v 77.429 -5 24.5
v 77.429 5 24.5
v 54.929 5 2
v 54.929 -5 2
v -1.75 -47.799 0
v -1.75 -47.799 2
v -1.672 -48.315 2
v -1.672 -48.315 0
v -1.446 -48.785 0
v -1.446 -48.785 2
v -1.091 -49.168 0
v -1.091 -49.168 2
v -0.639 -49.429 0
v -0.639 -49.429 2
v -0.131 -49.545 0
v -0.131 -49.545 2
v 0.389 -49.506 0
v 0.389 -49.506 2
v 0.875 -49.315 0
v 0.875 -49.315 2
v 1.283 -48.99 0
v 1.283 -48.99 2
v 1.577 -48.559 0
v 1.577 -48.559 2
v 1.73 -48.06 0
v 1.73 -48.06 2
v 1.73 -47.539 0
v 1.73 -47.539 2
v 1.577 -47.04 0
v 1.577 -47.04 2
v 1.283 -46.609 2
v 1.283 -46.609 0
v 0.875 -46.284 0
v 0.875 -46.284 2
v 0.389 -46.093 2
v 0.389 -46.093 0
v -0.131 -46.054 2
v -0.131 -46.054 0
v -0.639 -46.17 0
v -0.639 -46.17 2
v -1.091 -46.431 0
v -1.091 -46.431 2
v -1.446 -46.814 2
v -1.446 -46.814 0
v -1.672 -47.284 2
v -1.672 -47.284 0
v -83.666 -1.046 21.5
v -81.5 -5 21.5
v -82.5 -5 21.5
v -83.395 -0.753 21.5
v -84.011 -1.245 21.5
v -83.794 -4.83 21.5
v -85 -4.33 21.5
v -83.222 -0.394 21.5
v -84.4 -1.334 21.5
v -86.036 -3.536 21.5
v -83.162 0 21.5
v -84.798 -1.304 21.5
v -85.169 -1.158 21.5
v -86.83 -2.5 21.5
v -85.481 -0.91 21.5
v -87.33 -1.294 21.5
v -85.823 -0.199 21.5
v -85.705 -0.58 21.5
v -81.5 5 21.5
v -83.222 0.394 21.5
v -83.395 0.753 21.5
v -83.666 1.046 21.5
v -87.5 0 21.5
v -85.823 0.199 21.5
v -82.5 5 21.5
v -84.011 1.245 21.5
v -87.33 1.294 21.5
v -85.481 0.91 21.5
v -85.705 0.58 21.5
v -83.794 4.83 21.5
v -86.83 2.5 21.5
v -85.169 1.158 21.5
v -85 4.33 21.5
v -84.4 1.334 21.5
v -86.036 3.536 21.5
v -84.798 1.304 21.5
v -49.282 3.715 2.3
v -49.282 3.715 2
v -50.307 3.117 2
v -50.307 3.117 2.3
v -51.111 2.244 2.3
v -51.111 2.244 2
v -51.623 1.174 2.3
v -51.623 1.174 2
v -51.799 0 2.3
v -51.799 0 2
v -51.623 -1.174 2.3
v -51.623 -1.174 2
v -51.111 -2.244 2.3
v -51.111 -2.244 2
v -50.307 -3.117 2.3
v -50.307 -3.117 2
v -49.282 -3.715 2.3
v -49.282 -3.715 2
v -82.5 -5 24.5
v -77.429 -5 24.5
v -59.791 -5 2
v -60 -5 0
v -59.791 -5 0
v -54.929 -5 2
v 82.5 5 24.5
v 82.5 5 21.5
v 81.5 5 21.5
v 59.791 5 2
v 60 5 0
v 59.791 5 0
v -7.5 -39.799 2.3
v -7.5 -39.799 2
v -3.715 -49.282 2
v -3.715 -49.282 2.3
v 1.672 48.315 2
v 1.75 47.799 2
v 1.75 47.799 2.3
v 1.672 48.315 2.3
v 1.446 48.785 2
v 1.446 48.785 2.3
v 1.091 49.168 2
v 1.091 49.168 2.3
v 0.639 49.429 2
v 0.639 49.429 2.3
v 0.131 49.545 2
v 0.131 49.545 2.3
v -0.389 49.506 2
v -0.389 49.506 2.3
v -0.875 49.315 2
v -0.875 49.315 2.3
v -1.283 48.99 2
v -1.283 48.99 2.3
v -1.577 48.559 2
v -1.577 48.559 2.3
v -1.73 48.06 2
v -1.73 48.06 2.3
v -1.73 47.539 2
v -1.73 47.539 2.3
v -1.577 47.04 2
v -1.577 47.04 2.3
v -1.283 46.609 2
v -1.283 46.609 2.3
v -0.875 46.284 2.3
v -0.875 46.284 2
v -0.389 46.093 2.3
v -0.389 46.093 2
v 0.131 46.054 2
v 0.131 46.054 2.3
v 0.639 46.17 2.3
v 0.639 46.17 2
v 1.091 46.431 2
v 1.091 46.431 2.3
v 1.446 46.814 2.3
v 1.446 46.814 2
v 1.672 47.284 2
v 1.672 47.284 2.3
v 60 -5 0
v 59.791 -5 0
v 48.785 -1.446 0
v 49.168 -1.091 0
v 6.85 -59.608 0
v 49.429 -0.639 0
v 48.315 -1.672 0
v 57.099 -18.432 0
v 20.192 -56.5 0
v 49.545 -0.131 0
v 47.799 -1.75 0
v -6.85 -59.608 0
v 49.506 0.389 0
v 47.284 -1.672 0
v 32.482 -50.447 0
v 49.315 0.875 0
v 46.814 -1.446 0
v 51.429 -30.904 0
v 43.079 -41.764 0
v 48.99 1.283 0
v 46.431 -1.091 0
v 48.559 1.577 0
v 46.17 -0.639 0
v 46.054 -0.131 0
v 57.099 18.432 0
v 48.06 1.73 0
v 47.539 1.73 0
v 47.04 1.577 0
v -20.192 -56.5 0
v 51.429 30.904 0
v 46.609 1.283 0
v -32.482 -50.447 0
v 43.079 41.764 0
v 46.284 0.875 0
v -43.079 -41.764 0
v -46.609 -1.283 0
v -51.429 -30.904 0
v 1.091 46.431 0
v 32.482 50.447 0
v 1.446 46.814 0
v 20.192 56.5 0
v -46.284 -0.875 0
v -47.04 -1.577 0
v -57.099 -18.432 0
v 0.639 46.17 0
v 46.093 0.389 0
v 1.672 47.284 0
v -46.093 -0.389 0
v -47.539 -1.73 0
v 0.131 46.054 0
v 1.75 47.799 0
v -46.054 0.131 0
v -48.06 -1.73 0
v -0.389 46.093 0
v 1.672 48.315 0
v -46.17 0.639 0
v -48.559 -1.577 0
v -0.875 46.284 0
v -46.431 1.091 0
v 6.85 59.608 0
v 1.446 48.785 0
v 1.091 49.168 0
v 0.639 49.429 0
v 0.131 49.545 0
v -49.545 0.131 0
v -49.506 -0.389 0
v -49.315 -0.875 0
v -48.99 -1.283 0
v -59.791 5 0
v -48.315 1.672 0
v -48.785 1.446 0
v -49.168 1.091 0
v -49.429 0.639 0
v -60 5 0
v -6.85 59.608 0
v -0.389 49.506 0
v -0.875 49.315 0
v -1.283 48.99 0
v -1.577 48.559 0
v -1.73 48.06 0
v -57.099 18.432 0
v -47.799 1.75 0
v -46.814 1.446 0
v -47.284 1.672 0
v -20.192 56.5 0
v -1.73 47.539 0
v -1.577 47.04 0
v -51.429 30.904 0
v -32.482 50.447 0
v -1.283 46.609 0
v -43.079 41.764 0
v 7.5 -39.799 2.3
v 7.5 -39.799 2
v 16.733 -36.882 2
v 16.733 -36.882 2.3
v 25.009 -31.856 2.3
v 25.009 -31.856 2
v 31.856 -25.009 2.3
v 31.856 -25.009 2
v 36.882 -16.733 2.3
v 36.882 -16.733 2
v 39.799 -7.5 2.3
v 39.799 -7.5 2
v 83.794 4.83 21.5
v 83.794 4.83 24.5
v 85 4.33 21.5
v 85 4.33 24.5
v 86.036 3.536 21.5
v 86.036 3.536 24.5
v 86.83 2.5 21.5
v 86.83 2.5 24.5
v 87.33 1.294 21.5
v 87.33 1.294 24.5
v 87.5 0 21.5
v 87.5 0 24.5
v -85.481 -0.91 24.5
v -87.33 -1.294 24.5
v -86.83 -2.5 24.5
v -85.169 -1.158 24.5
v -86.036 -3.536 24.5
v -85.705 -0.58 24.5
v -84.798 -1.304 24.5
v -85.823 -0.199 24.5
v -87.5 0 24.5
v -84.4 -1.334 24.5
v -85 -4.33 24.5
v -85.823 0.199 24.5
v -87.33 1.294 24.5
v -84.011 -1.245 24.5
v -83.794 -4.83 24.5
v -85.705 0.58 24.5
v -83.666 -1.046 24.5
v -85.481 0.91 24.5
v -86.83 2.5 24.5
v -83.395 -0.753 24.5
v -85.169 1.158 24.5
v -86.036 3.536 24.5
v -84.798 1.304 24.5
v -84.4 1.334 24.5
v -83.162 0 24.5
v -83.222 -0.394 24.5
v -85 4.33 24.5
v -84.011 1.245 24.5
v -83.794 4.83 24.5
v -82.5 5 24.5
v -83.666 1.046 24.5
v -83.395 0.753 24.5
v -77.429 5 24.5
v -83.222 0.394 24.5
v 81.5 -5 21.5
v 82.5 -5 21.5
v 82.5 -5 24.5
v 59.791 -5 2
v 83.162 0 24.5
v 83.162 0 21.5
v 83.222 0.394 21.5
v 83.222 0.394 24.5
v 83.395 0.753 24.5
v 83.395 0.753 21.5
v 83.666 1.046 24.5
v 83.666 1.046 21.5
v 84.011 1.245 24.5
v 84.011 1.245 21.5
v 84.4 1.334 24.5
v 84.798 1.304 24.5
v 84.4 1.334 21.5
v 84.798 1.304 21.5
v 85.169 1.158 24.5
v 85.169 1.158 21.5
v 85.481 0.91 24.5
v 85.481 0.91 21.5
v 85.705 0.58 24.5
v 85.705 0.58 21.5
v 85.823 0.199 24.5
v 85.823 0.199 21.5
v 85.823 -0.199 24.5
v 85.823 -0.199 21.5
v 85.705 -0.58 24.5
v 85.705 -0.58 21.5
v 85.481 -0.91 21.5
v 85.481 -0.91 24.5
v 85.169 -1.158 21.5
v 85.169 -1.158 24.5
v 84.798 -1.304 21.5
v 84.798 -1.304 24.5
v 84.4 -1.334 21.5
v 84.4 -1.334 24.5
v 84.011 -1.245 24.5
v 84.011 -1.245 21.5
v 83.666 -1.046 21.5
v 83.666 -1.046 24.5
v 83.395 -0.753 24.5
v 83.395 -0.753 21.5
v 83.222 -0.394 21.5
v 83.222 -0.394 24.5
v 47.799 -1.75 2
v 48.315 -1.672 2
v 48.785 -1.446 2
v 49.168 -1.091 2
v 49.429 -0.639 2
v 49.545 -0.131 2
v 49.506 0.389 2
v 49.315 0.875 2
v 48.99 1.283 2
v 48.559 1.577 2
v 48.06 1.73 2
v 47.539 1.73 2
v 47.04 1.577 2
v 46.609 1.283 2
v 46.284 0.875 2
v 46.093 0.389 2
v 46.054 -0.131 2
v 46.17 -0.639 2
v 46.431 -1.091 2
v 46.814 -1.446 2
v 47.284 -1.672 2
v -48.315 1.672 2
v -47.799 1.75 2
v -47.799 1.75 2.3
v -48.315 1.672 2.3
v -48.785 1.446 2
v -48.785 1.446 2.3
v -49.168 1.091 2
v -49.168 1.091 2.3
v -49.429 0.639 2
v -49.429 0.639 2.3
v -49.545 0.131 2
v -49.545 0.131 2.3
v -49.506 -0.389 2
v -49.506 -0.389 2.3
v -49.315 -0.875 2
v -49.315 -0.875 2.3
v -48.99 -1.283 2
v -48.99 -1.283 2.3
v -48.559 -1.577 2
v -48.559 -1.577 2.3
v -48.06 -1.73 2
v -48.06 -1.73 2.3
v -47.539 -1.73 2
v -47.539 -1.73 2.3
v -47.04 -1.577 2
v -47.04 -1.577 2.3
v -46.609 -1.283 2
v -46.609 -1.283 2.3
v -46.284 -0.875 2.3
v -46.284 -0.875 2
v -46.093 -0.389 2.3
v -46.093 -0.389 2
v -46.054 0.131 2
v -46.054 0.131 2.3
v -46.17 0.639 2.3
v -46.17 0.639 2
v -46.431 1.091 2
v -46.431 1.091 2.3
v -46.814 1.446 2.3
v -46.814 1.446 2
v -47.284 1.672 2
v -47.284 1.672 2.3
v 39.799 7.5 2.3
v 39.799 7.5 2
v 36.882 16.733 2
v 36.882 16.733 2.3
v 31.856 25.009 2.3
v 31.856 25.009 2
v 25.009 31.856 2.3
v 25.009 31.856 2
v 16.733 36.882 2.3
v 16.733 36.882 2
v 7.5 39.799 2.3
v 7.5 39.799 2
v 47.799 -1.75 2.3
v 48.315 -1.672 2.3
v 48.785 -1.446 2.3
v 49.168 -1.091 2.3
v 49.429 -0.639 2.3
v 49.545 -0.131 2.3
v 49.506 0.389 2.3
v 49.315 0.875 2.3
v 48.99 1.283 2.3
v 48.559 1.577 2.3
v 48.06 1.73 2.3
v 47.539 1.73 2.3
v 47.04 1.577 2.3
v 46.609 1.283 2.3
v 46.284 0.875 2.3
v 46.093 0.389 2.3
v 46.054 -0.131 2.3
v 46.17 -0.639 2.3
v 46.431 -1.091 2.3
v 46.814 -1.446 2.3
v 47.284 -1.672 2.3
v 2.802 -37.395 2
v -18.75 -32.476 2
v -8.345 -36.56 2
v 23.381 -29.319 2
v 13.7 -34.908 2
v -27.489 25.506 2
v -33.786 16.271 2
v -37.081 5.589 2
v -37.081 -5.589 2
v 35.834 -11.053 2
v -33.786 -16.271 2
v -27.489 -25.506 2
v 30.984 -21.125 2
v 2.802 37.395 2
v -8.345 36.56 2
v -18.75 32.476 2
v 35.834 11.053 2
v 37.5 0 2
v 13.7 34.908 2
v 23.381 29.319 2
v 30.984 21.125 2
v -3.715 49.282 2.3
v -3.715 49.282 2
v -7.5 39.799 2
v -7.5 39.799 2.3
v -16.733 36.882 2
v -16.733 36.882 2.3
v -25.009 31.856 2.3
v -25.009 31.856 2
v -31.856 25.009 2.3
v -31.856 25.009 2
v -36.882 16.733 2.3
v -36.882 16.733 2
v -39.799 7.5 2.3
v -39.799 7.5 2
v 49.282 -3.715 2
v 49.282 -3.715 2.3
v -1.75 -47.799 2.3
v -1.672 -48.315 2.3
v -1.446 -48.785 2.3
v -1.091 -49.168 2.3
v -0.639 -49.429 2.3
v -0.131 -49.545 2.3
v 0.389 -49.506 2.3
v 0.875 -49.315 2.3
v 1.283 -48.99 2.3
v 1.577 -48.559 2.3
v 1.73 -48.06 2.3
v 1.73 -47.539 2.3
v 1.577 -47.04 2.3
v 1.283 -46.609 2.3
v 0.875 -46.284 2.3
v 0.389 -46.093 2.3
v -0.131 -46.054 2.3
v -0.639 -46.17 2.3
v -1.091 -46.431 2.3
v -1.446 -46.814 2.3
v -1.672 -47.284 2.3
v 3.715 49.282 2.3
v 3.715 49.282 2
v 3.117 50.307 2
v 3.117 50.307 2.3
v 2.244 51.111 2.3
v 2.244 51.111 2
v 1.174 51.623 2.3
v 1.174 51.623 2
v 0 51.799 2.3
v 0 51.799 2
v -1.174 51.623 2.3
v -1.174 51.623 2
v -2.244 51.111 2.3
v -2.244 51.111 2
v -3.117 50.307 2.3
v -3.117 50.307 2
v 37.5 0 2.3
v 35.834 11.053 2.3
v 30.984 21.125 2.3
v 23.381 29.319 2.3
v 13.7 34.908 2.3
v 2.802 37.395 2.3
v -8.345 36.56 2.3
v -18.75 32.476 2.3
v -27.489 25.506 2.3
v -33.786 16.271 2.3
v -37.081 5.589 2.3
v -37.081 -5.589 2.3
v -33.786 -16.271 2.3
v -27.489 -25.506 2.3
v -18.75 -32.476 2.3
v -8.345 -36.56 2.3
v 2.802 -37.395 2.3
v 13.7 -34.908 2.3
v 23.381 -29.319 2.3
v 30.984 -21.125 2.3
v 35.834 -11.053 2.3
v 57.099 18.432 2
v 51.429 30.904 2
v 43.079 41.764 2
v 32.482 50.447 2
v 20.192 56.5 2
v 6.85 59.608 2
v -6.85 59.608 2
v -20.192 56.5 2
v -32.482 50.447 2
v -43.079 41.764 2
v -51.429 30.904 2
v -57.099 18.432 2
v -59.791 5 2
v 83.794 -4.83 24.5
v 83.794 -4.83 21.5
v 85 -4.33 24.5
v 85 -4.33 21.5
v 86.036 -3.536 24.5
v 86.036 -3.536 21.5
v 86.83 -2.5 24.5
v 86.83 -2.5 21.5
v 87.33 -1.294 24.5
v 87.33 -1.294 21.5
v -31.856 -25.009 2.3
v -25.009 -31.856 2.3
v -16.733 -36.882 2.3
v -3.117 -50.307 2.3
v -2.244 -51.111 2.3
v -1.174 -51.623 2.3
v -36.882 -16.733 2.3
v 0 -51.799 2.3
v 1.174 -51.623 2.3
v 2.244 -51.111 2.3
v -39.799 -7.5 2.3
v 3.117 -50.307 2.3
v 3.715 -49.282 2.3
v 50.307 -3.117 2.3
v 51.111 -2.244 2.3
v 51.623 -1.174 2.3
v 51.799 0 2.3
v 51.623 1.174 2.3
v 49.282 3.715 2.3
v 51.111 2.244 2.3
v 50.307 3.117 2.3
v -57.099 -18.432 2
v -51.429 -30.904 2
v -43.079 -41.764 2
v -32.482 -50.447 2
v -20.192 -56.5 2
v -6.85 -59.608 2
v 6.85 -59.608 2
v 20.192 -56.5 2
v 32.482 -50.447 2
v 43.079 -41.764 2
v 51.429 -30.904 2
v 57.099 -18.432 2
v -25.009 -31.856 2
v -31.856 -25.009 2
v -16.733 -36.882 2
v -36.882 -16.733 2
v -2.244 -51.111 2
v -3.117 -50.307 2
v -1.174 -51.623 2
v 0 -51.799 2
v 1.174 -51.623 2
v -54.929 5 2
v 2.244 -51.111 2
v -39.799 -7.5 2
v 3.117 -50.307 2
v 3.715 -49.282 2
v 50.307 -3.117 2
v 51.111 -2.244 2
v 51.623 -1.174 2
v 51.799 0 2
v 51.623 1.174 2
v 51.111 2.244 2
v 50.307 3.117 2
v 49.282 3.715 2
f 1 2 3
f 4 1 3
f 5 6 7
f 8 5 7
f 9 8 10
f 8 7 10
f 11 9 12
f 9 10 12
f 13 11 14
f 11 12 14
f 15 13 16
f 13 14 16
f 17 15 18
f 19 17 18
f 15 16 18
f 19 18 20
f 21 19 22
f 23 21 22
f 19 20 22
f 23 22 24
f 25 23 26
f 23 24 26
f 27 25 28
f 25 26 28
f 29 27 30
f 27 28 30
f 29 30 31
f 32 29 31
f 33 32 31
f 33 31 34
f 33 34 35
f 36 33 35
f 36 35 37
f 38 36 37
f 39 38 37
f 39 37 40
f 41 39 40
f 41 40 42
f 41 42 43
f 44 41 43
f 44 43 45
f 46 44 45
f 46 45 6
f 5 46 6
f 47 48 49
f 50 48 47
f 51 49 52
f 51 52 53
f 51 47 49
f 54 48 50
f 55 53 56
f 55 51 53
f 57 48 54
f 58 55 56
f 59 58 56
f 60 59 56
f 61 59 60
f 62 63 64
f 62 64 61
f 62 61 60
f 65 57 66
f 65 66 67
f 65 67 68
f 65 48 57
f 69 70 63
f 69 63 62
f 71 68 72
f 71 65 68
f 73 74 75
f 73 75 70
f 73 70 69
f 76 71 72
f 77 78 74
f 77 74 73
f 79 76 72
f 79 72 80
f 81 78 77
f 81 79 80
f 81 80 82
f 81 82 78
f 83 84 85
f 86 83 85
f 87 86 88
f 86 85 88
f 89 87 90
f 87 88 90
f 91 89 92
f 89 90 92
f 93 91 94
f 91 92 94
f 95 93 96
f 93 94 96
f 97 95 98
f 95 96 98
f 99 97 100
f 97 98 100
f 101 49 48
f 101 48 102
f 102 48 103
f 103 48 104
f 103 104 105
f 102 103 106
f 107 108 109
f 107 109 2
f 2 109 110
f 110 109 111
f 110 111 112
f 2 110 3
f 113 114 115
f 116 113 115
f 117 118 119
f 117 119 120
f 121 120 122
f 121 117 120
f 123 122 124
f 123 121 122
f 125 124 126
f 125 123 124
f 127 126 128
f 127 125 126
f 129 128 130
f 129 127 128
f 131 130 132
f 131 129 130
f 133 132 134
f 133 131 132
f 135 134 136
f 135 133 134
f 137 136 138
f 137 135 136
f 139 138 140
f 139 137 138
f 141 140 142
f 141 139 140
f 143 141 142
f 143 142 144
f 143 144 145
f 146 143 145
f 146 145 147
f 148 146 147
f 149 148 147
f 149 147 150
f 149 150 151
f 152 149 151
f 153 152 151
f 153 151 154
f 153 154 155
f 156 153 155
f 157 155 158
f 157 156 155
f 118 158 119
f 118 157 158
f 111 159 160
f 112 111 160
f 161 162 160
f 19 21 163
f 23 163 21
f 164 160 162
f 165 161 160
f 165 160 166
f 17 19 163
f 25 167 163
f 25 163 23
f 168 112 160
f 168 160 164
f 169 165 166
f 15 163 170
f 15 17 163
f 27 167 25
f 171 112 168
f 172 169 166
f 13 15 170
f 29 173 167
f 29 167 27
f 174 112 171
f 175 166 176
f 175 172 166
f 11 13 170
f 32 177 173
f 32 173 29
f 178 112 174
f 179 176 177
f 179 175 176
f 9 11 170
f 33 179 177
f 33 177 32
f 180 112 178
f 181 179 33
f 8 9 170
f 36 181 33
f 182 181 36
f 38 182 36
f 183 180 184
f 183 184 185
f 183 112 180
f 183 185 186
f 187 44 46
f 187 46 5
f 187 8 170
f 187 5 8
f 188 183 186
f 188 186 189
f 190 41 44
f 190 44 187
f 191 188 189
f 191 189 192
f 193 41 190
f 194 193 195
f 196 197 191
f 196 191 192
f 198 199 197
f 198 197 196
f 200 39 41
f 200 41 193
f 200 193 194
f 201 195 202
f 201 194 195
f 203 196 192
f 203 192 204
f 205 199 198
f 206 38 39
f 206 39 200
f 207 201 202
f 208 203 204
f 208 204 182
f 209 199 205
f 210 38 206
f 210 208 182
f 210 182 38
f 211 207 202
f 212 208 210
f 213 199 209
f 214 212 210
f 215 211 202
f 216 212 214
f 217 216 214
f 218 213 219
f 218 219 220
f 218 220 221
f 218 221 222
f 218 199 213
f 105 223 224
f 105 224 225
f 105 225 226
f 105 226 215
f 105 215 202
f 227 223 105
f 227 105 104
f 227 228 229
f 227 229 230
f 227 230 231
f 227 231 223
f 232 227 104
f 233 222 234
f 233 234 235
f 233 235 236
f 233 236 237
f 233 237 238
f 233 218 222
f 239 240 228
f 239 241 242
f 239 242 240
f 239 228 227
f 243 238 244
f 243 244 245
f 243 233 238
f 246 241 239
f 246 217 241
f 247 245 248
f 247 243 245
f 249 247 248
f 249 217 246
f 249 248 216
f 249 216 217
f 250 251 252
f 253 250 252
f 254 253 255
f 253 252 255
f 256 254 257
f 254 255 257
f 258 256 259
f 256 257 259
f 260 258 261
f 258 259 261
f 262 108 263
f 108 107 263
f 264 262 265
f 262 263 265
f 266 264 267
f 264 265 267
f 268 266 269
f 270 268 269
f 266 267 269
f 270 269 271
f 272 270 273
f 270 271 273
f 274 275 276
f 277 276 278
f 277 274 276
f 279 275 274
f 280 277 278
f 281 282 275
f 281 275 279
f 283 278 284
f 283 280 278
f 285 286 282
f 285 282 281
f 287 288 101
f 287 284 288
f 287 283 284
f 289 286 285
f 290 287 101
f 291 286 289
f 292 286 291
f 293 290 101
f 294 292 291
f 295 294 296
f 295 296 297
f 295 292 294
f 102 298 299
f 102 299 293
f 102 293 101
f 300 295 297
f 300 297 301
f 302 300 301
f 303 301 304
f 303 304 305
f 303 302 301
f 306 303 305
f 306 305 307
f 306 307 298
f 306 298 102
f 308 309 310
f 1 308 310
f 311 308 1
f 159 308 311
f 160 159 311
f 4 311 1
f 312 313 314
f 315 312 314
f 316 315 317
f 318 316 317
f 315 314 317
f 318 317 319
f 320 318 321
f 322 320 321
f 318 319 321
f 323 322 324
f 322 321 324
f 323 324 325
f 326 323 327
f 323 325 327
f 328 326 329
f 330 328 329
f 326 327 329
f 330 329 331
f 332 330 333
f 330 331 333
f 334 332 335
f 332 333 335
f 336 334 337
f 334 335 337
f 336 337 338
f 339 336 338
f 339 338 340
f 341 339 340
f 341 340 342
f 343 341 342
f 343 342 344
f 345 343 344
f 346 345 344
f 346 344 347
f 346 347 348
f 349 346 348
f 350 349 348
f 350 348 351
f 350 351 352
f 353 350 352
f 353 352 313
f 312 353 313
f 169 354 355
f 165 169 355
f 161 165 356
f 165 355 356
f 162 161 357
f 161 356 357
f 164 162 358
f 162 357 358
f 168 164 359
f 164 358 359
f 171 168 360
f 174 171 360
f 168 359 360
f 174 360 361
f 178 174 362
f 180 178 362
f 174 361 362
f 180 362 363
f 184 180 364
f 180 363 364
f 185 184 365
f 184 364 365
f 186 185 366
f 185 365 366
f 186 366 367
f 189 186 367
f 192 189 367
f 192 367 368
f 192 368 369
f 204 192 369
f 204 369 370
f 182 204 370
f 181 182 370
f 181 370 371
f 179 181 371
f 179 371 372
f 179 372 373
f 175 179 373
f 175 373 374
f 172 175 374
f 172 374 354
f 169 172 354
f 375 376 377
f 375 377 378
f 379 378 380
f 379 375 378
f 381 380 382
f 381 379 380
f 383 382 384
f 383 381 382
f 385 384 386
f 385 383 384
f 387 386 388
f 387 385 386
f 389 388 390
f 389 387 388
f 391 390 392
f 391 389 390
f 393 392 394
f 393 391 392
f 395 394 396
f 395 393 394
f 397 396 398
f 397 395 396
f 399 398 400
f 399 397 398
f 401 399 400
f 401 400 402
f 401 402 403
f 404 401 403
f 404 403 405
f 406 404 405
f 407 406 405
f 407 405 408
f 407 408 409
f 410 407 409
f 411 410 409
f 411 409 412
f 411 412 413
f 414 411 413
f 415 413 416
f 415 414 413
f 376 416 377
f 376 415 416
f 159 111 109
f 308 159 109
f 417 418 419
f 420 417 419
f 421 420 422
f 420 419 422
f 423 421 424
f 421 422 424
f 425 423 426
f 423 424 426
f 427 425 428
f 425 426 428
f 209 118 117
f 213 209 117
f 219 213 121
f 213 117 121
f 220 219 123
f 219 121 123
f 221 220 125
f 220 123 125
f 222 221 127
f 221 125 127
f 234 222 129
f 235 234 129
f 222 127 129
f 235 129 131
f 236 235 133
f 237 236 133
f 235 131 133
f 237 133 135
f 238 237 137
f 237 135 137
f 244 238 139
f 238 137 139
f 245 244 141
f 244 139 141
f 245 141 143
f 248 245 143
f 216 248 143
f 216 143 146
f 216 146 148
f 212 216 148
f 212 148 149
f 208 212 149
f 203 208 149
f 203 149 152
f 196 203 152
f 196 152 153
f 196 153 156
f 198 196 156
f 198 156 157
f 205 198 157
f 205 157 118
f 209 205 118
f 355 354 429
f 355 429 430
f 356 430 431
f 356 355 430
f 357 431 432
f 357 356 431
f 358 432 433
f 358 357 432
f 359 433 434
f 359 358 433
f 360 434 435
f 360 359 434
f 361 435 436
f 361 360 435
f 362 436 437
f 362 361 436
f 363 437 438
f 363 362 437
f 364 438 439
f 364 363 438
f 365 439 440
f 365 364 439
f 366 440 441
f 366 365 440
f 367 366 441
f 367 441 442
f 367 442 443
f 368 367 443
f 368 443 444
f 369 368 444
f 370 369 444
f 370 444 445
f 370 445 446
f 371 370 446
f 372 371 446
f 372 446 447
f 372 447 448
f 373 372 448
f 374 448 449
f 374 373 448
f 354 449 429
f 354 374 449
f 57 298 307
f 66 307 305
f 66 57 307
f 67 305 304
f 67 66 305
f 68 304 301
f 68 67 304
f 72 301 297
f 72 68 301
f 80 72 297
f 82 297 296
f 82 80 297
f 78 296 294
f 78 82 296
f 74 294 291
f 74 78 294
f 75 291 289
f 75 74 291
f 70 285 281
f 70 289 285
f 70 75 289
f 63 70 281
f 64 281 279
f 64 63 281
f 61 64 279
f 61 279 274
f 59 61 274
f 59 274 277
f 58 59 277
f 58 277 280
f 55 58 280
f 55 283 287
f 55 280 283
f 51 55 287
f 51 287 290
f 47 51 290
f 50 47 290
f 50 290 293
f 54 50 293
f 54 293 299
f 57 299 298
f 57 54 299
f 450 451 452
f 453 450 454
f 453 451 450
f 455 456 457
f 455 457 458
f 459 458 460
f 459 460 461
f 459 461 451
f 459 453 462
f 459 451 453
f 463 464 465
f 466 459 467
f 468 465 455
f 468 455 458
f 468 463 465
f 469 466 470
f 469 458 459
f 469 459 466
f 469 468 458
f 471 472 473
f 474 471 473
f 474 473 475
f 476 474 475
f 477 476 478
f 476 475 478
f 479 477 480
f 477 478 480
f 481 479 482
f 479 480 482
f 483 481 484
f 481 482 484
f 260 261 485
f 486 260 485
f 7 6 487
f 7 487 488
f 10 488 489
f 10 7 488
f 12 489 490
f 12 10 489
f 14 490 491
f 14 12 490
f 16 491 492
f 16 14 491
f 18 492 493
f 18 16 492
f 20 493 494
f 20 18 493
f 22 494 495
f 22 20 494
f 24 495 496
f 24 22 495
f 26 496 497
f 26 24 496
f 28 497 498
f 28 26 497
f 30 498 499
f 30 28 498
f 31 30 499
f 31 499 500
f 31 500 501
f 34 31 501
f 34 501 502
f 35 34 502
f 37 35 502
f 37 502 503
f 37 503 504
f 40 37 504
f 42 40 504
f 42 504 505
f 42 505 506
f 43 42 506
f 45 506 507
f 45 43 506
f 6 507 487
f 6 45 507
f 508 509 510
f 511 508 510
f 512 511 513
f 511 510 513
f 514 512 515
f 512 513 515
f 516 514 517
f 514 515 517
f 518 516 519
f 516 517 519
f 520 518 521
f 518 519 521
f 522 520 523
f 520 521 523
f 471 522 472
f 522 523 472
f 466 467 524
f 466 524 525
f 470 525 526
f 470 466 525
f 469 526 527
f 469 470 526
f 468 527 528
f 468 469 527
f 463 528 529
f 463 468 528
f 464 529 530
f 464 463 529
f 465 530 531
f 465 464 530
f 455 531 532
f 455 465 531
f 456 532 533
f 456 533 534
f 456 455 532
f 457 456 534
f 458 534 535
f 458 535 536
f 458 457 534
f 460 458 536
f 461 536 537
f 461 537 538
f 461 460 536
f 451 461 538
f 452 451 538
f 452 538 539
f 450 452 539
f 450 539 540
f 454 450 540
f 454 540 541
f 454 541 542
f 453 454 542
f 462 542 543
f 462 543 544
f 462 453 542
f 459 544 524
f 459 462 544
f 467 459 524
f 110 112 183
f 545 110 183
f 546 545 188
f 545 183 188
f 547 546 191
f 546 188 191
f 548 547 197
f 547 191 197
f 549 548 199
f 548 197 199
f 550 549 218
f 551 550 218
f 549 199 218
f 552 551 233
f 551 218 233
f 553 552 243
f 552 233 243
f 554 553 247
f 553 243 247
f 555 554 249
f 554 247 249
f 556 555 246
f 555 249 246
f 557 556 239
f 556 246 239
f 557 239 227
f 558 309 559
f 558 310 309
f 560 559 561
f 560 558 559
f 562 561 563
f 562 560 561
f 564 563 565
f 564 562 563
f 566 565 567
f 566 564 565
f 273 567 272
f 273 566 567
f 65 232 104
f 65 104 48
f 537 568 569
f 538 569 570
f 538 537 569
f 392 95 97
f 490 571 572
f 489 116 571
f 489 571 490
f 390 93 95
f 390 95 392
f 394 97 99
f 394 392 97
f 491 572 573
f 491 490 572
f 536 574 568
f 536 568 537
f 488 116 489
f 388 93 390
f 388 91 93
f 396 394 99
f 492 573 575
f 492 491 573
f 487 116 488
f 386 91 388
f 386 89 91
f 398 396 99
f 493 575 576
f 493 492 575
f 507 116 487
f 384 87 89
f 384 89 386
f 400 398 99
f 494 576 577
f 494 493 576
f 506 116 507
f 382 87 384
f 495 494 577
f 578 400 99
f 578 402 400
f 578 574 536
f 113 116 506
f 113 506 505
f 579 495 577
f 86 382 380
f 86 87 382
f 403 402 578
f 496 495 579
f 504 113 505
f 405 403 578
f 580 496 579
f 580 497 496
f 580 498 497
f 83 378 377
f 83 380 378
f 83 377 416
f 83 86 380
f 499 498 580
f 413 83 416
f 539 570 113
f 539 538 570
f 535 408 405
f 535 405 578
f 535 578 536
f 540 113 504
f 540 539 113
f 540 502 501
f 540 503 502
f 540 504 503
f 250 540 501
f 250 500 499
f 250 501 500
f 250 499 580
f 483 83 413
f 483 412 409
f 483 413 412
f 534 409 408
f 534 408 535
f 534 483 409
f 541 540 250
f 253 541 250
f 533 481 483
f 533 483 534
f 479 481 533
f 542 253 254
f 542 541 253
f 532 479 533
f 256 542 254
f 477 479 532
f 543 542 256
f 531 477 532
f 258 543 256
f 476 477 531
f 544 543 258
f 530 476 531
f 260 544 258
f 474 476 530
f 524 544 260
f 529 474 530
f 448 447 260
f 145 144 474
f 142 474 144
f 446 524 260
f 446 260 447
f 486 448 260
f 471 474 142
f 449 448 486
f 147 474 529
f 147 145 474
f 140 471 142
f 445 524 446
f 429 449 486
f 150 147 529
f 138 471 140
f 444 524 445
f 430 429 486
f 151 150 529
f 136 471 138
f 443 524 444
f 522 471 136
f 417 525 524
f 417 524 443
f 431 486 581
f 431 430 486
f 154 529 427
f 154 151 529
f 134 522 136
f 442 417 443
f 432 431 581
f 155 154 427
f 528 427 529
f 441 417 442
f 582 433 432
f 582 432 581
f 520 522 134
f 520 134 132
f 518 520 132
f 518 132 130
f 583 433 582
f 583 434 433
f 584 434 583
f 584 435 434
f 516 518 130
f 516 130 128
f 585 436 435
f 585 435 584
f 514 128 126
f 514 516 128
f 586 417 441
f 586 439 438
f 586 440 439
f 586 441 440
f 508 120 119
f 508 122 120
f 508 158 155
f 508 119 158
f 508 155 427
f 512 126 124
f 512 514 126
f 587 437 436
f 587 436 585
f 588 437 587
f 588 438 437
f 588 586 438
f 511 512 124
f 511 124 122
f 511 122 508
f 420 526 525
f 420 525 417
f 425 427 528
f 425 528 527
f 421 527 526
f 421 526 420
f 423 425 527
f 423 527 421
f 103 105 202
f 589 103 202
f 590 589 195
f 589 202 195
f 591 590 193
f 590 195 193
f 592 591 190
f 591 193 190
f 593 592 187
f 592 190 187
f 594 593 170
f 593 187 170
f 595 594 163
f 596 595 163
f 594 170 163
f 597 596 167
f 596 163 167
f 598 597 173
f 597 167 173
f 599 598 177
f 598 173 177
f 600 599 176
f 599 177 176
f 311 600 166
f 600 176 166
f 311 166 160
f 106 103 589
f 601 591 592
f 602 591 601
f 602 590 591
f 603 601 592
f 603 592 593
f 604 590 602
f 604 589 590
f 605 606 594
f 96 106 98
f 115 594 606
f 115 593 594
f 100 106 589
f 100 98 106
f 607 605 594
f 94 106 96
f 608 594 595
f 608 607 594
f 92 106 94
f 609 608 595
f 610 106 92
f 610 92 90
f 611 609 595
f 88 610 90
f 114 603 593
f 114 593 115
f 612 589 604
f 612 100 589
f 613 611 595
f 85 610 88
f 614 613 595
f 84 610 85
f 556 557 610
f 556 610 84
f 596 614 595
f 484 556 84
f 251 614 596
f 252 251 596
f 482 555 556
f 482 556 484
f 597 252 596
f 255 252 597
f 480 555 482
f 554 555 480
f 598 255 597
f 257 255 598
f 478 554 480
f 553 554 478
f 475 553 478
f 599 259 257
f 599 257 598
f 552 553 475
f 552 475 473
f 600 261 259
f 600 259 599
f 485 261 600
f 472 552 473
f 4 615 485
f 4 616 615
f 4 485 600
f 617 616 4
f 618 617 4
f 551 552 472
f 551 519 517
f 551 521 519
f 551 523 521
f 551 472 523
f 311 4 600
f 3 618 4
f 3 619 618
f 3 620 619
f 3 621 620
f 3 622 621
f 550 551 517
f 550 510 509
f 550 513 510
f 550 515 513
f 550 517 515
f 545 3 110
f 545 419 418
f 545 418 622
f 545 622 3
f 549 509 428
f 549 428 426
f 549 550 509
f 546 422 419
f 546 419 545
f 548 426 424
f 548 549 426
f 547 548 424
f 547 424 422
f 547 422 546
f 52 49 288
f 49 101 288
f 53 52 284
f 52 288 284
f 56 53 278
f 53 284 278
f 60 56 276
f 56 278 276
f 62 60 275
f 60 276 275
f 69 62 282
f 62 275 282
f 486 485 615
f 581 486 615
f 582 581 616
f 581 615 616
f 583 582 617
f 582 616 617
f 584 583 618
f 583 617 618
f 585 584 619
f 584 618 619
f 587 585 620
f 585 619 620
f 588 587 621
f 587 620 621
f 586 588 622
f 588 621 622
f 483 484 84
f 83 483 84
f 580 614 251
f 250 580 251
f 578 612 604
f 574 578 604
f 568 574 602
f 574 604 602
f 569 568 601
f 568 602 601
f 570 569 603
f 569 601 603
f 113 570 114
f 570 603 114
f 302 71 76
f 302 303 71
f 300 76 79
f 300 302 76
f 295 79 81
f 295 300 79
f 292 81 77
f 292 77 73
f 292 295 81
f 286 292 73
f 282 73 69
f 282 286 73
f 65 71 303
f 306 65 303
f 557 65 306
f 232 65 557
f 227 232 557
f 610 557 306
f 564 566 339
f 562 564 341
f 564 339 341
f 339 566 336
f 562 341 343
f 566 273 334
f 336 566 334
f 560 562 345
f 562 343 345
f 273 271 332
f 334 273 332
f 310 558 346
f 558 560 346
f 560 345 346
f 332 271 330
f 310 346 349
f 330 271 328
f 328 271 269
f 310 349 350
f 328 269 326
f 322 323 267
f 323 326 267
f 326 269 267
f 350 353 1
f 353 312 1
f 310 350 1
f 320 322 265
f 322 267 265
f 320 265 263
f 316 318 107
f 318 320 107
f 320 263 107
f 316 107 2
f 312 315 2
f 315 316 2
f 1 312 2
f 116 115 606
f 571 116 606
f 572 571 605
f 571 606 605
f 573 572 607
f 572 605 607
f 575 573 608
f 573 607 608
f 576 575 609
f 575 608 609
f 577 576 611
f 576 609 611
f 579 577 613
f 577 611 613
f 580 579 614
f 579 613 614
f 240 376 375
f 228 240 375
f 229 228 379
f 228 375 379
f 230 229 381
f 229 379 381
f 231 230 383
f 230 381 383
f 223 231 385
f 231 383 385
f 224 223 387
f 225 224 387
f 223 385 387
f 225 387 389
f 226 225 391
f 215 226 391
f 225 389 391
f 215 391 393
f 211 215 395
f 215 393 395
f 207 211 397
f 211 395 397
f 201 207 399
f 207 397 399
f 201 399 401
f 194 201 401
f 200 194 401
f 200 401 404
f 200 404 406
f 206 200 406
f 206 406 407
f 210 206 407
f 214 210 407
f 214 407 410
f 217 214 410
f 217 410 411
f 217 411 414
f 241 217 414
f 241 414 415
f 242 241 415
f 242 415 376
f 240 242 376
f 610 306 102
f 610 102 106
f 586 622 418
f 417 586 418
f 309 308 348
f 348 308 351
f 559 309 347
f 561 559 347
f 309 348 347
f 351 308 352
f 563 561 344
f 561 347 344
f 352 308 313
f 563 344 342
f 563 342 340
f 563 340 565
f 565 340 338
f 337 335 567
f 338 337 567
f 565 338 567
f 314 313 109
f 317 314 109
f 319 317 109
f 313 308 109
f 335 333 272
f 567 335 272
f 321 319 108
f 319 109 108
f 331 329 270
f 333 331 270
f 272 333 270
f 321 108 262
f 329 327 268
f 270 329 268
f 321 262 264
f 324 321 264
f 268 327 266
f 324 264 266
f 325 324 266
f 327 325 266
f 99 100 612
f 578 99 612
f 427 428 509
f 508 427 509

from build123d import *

# Parameters (mm, degrees)
SKETCH1_R            = 60
BOSS_EXTRUDE1_DEPTH  = 2
SKETCH4_R            = 40.5
SKETCH4_R_2          = 37.5
BOSS_EXTRUDE4_DEPTH  = 0.3
SKETCH5_R            = 1.75
BOSS_EXTRUDE5_DEPTH  = 0.3
CIRPATTERN1_COUNT    = 4
SKETCH6_R            = 1.75
CUT_EXTRUDE1_DEPTH   = 85.876380696
BOSS_EXTRUDE6_DEPTH  = 5
SKETCH8_R            = 1.337594407
CUT_EXTRUDE2_DEPTH   = 109.252020766
FILLET1_R            = 5
FILLET1_OF_MIRROR1_R = 5


with BuildPart() as part:
    # Sketch1 → Boss-Extrude1 (new body)
    with BuildSketch(Plane.XY):
        Circle(SKETCH1_R)
    extrude(amount=BOSS_EXTRUDE1_DEPTH)

    # Sketch4 → Boss-Extrude4 (add)
    with BuildSketch(Plane.XY.offset(2)):
        Circle(SKETCH4_R)
        Circle(SKETCH4_R_2, mode=Mode.SUBTRACT)
    extrude(amount=BOSS_EXTRUDE4_DEPTH)

    # Sketch5 → Boss-Extrude5 (add)
    with BuildSketch(Plane.XY.offset(2)):
        with BuildLine():
            Line((-7.5, 39.799497484), (7.5, 39.799497484))
            Line((7.5, 39.799497484), (3.715004122, 49.282313849))
            ThreePointArc((3.715004122, 49.282313849), (0, 51.799497484), (-3.715004122, 49.282313849))
            Line((-3.715004122, 49.282313849), (-7.5, 39.799497484))
        make_face()
        with Locations((0, 47.799497484)):
            Circle(SKETCH5_R, mode=Mode.SUBTRACT)
    boss_extrude5 = extrude(amount=BOSS_EXTRUDE5_DEPTH)

    # CirPattern1: Boss-Extrude5 ×4 about axis
    cirpattern1_axis = Axis((0, 0, 0), (0, 0, 1))
    for i in range(1, CIRPATTERN1_COUNT):
        add(boss_extrude5.rotate(cirpattern1_axis, i * 360 / CIRPATTERN1_COUNT))

    # Sketch6 → Cut-Extrude1 (cut, through all)
    with BuildSketch(Plane.XY.offset(2)):
        with Locations((0, 47.799497484)):
            Circle(SKETCH6_R)
        with Locations(Location((-47.799497484, 0, 0), (0, 0, 90))):
            Circle(SKETCH6_R)
        with Locations(Location((47.799497484, 0, 0), (0, 0, 270))):
            Circle(SKETCH6_R)
        with Locations(Location((0, -47.799497484, 0), (0, 0, 180))):
            Circle(SKETCH6_R)
    extrude(amount=-CUT_EXTRUDE1_DEPTH, mode=Mode.SUBTRACT)

    # Sketch7 → Boss-Extrude6 (add, symmetric)
    with BuildSketch(Plane(origin=(0, 0, 0), x_dir=(1, 0, 0), z_dir=(0, 1, 0))):
        Polygon((60, 0), (81.5, -21.5), (87.5, -21.5), (87.5, -24.5), (77.428932188, -24.5), (52.928932188, 0), align=None)
    boss_extrude6 = extrude(amount=BOSS_EXTRUDE6_DEPTH, both=True)

    # Sketch8 → Cut-Extrude2 (cut, through all)
    with BuildSketch(Plane(origin=(0, 0, 21.5), x_dir=(-1, 0, 0), z_dir=(0, 0, -1))):
        with Locations((-84.5, 0)):
            Circle(SKETCH8_R)
    cut_extrude2 = extrude(amount=-CUT_EXTRUDE2_DEPTH, mode=Mode.SUBTRACT)

    # Fillet1
    fillet1_edges = [part.edges().sort_by_distance(p)[0] for p in [
        (87.5, -5, 23),
        (87.5, 5, 23),
    ]]
    fillet(fillet1_edges, radius=FILLET1_R - 0.0001)  # a hair under: the kernel refuses the full size

    # Mirror1: Boss-Extrude6, Cut-Extrude2 across plane
    add(boss_extrude6.mirror(Plane(origin=(0, 0, 0), x_dir=(0, 0, 1), z_dir=(1, 0, 0))))
    add(cut_extrude2.mirror(Plane(origin=(0, 0, 0), x_dir=(0, 0, 1), z_dir=(1, 0, 0))), mode=Mode.SUBTRACT)

    # Fillet1 of Mirror1
    fillet1_of_mirror1_edges = [part.edges().sort_by_distance(p)[0] for p in [
        (-87.5, -5, 23),
        (-87.5, 5, 23),
    ]]
    fillet(fillet1_of_mirror1_edges, radius=FILLET1_OF_MIRROR1_R - 0.0001)  # a hair under: the kernel refuses the full size


solid = part.part
